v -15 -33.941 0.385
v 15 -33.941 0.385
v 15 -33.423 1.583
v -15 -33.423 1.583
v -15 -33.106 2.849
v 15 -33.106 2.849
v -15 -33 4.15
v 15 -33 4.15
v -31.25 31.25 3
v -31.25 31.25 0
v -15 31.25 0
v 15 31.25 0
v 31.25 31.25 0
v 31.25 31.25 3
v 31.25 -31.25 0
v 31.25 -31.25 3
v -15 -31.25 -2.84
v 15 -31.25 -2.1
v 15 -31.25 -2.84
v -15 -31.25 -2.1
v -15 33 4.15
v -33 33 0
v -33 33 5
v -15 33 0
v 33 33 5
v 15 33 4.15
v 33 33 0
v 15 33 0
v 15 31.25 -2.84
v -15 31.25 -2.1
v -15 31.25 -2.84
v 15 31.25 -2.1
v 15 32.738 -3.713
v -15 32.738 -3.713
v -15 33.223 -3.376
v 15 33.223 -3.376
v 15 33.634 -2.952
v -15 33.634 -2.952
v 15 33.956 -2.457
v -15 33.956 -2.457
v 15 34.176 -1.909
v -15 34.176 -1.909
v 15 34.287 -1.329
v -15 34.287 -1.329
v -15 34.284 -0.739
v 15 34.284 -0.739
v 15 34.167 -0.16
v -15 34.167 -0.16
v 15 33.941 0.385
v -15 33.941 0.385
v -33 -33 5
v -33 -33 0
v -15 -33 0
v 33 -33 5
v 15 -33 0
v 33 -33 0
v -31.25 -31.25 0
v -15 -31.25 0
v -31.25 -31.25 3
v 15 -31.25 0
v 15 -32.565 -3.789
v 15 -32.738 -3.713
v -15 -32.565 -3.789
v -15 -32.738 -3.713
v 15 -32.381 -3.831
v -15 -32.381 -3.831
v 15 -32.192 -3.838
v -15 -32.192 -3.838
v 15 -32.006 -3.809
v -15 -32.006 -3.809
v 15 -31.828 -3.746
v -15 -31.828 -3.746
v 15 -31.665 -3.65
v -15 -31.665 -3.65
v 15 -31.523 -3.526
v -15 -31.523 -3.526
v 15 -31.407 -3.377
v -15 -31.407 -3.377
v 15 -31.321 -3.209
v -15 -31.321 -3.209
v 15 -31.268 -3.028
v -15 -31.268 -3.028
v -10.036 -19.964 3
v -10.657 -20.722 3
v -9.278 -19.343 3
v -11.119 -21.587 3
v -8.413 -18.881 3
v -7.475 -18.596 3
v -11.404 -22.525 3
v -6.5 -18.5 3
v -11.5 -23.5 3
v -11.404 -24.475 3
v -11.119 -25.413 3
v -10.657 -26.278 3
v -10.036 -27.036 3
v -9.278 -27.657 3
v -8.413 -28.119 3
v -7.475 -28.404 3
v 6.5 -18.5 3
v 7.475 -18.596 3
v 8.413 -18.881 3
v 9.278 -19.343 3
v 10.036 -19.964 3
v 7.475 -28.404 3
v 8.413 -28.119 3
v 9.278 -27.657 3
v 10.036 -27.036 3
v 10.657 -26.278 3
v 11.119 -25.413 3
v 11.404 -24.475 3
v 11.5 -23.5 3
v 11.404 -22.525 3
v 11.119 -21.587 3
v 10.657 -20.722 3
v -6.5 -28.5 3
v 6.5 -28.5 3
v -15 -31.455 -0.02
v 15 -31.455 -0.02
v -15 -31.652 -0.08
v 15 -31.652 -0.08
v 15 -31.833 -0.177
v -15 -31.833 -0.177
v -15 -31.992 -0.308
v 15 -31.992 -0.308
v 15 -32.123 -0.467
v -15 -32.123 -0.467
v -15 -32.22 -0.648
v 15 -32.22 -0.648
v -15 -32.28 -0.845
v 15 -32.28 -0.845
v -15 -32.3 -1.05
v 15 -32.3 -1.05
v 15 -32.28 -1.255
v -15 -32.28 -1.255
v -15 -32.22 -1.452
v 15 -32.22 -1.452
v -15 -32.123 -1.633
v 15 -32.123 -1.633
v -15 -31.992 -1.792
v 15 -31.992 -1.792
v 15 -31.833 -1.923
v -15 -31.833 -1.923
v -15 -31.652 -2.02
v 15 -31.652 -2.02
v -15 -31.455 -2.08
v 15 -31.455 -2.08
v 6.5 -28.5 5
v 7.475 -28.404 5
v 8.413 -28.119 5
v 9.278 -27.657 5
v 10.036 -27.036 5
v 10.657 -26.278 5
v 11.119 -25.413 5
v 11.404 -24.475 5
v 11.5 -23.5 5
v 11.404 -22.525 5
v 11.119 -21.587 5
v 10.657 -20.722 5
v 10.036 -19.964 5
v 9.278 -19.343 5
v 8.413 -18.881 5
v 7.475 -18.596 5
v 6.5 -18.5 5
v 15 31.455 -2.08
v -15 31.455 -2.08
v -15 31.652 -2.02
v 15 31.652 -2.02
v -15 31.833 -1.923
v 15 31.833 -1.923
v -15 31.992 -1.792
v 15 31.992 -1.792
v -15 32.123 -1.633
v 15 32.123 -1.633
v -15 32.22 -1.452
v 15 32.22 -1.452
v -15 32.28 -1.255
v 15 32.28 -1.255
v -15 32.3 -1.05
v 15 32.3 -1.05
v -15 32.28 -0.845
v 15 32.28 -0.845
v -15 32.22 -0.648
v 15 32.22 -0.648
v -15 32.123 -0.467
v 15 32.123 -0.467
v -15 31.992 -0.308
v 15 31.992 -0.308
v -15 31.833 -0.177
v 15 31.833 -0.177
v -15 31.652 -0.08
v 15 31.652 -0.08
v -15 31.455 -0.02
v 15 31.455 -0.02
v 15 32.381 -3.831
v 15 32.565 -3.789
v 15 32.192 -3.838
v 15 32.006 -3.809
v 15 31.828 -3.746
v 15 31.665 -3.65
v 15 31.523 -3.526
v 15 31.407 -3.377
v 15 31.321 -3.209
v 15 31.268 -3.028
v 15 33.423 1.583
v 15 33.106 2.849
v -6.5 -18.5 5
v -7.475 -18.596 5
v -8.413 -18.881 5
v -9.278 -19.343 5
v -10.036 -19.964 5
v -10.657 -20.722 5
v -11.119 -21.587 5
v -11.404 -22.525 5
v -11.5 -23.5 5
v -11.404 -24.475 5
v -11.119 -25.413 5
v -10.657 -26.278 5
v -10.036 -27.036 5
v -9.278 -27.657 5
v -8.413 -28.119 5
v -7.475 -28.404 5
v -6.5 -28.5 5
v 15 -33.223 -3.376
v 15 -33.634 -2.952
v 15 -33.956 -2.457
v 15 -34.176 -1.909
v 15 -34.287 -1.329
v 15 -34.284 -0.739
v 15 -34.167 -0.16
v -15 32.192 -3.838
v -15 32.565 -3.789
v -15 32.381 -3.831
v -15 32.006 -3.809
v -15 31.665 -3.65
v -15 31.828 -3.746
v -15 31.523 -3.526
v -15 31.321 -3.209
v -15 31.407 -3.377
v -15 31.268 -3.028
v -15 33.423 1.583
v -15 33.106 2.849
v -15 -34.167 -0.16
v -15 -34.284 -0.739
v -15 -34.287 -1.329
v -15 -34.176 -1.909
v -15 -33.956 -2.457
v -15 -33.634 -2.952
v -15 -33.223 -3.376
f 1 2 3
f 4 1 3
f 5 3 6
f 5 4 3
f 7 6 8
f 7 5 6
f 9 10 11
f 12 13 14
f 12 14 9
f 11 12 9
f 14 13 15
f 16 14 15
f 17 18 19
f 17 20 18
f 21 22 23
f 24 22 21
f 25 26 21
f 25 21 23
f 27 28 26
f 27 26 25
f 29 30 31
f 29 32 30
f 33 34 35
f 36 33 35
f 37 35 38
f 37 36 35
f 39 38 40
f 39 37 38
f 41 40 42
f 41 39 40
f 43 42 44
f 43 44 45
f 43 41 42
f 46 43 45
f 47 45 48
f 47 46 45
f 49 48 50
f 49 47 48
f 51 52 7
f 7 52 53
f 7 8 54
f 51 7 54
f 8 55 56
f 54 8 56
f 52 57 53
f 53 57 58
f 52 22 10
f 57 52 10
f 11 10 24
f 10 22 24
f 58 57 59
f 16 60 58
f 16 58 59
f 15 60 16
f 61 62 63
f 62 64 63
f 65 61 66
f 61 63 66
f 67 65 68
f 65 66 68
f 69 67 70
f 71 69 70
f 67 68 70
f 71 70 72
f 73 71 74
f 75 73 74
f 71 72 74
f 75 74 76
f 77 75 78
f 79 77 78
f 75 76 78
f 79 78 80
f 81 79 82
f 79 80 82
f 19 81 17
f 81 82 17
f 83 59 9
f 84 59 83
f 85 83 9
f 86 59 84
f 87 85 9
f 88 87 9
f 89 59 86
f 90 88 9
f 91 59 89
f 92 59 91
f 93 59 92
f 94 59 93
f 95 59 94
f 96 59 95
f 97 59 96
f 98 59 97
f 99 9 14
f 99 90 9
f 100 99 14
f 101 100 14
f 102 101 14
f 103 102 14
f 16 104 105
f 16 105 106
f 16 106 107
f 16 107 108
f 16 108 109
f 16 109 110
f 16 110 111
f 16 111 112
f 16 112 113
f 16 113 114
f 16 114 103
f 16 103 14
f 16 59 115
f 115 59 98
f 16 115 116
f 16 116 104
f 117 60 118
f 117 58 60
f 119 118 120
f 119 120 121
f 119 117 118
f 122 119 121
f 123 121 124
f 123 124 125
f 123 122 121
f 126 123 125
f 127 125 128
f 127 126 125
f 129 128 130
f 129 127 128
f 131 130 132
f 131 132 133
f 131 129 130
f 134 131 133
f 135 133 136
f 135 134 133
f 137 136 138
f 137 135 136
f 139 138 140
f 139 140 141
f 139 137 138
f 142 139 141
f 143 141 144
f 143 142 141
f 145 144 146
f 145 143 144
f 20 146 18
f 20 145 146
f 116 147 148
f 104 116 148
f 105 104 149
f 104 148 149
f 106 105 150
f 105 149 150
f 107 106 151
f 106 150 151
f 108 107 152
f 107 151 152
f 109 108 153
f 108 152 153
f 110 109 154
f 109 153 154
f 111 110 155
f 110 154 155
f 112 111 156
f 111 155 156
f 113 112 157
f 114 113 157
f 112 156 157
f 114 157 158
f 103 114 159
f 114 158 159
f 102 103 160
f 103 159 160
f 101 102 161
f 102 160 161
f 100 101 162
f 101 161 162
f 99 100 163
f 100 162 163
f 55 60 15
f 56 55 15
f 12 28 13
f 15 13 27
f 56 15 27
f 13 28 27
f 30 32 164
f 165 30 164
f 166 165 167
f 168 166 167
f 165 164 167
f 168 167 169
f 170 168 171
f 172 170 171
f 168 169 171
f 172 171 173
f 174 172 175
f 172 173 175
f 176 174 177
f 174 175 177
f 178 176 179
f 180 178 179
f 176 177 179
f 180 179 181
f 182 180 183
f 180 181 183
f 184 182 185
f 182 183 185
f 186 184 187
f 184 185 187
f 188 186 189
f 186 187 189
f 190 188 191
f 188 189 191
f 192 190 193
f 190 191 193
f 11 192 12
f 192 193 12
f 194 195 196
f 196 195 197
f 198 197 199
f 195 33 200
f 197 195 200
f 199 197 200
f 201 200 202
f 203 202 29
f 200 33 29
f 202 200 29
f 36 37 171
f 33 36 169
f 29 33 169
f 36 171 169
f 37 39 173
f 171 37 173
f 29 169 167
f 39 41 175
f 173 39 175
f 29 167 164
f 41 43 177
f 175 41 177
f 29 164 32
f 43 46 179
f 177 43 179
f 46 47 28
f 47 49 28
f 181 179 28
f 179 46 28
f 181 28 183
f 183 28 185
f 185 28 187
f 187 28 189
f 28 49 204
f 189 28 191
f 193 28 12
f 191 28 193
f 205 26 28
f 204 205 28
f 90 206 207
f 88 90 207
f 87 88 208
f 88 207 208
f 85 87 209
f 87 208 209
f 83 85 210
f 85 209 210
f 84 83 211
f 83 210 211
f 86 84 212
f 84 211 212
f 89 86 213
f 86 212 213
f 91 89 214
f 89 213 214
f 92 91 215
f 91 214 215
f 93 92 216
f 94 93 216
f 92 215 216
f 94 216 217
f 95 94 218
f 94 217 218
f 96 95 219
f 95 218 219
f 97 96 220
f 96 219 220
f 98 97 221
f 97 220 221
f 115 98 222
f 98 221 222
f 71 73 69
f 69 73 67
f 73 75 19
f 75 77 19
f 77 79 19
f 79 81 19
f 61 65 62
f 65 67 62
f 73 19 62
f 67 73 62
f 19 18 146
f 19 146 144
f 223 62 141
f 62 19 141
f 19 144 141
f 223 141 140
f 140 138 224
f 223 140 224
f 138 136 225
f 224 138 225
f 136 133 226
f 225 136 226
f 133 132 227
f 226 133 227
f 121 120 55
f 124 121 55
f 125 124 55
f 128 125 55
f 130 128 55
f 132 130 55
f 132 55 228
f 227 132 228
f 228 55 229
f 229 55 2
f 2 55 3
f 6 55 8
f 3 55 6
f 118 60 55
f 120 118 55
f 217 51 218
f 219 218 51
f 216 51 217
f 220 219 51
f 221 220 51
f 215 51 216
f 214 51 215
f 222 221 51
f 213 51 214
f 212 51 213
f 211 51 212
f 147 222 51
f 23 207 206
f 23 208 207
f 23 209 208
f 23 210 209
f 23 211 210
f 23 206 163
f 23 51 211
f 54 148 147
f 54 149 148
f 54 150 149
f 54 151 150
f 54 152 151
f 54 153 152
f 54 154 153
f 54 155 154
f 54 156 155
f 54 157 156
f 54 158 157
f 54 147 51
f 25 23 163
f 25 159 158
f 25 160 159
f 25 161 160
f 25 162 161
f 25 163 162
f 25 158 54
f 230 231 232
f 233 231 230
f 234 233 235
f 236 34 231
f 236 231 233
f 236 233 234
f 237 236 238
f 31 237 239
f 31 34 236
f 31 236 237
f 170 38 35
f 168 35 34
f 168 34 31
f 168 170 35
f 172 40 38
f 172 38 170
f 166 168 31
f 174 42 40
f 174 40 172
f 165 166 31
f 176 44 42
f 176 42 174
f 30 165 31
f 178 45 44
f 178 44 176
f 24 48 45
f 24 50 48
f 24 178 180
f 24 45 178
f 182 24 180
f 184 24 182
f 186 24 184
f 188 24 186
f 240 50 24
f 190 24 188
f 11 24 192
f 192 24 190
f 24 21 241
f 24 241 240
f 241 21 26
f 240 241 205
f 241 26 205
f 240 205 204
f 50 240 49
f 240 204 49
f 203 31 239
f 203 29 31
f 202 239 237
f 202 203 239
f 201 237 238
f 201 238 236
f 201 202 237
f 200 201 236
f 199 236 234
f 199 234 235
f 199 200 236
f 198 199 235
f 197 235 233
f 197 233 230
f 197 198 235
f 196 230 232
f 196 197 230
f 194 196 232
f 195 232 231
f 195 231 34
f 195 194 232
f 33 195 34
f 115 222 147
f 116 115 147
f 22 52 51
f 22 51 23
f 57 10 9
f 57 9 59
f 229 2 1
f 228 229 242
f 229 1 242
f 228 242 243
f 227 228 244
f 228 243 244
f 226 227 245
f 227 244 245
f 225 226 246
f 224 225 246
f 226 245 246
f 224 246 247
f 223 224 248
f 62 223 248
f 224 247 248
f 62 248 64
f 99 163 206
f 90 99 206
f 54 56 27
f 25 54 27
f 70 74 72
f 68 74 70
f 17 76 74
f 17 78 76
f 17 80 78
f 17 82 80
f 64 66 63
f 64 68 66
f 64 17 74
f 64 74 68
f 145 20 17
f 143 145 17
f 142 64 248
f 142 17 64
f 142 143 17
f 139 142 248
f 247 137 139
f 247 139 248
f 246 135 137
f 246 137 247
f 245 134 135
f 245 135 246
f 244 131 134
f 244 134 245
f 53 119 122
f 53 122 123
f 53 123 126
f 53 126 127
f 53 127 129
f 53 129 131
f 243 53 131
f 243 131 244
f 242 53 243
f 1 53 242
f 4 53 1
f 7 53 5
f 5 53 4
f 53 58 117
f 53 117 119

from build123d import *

# Parameters (mm, degrees)
SKETCH_W        = 66
SKETCH_H        = 66
PAD_DEPTH       = 5
SKETCH001_W     = 62.5
SKETCH001_H     = 62.5
POCKET_DEPTH    = 3
POCKET001_DEPTH = 2
PAD001_DEPTH    = 15
FILLET_R        = 1
FILLET001_R     = 1
FILLET002_R     = 8
FILLET003_R     = 8


with BuildPart() as part:
    # Sketch → Pad (new body)
    with BuildSketch(Plane.XY):
        Rectangle(SKETCH_W, SKETCH_H)
    extrude(amount=PAD_DEPTH)

    # Sketch001 (on Face5 of Pad) → Pocket (cut)
    with BuildSketch(Plane(origin=(0, 0, 0), x_dir=(1, 0, 0), z_dir=(0, 0, -1))):
        Rectangle(SKETCH001_W, SKETCH001_H)
    extrude(amount=-POCKET_DEPTH, mode=Mode.SUBTRACT)

    # Sketch002 (on Face5 of Pocket) → Pocket001 (cut)
    with BuildSketch(Plane.XY.offset(5)):
        with BuildLine():
            ThreePointArc((-6.5, -18.5), (-11.5, -23.5), (-6.5, -28.5))
            Line((-6.5, -28.5), (6.5, -28.5))
            ThreePointArc((6.5, -28.5), (11.5, -23.5), (6.5, -18.5))
            Line((6.5, -18.5), (-6.5, -18.5))
        make_face()
    extrude(amount=-POCKET001_DEPTH, mode=Mode.SUBTRACT)

    # Sketch003 (on DatumPlane) → Pad001 (join, symmetric)
    with BuildSketch(Plane(origin=(0, -33, 5), x_dir=(0, 1, 0), z_dir=(1, 0, 0))):
        with BuildLine():
            ThreePointArc((1.75, -5), (0.7, -6.05), (1.75, -7.1))
            Line((1.75, -7.1), (1.75, -9.1))
            ThreePointArc((1.75, -3), (-1.3, -6.05), (1.75, -9.1))
            Line((1.75, -5), (1.75, -3))
        make_face()
        with BuildLine():
            ThreePointArc((64.25, -7.1), (65.3, -6.05), (64.25, -5))
            Line((64.25, -5), (64.25, -3))
            ThreePointArc((64.25, -9.1), (67.3, -6.05), (64.25, -3))
            Line((64.25, -7.1), (64.25, -9.1))
        make_face()
    extrude(amount=PAD001_DEPTH, both=True)

    # Fillet
    fillet_edges = [part.edges().sort_by_distance(p)[0] for p in [
        (0, 31.25, -4.1),
    ]]
    fillet(fillet_edges, radius=FILLET_R)

    # Fillet001
    fillet001_edges = [part.edges().sort_by_distance(p)[0] for p in [
        (0, -31.25, -4.1),
    ]]
    fillet(fillet001_edges, radius=FILLET001_R)

    # Fillet002
    fillet002_edges = [part.edges().sort_by_distance(p)[0] for p in [
        (0, -33, 1.447999),
    ]]
    fillet(fillet002_edges, radius=FILLET002_R)

    # Fillet003
    fillet003_edges = [part.edges().sort_by_distance(p)[0] for p in [
        (0, 33, 1.447999),
    ]]
    fillet(fillet003_edges, radius=FILLET003_R)


solid = part.part
